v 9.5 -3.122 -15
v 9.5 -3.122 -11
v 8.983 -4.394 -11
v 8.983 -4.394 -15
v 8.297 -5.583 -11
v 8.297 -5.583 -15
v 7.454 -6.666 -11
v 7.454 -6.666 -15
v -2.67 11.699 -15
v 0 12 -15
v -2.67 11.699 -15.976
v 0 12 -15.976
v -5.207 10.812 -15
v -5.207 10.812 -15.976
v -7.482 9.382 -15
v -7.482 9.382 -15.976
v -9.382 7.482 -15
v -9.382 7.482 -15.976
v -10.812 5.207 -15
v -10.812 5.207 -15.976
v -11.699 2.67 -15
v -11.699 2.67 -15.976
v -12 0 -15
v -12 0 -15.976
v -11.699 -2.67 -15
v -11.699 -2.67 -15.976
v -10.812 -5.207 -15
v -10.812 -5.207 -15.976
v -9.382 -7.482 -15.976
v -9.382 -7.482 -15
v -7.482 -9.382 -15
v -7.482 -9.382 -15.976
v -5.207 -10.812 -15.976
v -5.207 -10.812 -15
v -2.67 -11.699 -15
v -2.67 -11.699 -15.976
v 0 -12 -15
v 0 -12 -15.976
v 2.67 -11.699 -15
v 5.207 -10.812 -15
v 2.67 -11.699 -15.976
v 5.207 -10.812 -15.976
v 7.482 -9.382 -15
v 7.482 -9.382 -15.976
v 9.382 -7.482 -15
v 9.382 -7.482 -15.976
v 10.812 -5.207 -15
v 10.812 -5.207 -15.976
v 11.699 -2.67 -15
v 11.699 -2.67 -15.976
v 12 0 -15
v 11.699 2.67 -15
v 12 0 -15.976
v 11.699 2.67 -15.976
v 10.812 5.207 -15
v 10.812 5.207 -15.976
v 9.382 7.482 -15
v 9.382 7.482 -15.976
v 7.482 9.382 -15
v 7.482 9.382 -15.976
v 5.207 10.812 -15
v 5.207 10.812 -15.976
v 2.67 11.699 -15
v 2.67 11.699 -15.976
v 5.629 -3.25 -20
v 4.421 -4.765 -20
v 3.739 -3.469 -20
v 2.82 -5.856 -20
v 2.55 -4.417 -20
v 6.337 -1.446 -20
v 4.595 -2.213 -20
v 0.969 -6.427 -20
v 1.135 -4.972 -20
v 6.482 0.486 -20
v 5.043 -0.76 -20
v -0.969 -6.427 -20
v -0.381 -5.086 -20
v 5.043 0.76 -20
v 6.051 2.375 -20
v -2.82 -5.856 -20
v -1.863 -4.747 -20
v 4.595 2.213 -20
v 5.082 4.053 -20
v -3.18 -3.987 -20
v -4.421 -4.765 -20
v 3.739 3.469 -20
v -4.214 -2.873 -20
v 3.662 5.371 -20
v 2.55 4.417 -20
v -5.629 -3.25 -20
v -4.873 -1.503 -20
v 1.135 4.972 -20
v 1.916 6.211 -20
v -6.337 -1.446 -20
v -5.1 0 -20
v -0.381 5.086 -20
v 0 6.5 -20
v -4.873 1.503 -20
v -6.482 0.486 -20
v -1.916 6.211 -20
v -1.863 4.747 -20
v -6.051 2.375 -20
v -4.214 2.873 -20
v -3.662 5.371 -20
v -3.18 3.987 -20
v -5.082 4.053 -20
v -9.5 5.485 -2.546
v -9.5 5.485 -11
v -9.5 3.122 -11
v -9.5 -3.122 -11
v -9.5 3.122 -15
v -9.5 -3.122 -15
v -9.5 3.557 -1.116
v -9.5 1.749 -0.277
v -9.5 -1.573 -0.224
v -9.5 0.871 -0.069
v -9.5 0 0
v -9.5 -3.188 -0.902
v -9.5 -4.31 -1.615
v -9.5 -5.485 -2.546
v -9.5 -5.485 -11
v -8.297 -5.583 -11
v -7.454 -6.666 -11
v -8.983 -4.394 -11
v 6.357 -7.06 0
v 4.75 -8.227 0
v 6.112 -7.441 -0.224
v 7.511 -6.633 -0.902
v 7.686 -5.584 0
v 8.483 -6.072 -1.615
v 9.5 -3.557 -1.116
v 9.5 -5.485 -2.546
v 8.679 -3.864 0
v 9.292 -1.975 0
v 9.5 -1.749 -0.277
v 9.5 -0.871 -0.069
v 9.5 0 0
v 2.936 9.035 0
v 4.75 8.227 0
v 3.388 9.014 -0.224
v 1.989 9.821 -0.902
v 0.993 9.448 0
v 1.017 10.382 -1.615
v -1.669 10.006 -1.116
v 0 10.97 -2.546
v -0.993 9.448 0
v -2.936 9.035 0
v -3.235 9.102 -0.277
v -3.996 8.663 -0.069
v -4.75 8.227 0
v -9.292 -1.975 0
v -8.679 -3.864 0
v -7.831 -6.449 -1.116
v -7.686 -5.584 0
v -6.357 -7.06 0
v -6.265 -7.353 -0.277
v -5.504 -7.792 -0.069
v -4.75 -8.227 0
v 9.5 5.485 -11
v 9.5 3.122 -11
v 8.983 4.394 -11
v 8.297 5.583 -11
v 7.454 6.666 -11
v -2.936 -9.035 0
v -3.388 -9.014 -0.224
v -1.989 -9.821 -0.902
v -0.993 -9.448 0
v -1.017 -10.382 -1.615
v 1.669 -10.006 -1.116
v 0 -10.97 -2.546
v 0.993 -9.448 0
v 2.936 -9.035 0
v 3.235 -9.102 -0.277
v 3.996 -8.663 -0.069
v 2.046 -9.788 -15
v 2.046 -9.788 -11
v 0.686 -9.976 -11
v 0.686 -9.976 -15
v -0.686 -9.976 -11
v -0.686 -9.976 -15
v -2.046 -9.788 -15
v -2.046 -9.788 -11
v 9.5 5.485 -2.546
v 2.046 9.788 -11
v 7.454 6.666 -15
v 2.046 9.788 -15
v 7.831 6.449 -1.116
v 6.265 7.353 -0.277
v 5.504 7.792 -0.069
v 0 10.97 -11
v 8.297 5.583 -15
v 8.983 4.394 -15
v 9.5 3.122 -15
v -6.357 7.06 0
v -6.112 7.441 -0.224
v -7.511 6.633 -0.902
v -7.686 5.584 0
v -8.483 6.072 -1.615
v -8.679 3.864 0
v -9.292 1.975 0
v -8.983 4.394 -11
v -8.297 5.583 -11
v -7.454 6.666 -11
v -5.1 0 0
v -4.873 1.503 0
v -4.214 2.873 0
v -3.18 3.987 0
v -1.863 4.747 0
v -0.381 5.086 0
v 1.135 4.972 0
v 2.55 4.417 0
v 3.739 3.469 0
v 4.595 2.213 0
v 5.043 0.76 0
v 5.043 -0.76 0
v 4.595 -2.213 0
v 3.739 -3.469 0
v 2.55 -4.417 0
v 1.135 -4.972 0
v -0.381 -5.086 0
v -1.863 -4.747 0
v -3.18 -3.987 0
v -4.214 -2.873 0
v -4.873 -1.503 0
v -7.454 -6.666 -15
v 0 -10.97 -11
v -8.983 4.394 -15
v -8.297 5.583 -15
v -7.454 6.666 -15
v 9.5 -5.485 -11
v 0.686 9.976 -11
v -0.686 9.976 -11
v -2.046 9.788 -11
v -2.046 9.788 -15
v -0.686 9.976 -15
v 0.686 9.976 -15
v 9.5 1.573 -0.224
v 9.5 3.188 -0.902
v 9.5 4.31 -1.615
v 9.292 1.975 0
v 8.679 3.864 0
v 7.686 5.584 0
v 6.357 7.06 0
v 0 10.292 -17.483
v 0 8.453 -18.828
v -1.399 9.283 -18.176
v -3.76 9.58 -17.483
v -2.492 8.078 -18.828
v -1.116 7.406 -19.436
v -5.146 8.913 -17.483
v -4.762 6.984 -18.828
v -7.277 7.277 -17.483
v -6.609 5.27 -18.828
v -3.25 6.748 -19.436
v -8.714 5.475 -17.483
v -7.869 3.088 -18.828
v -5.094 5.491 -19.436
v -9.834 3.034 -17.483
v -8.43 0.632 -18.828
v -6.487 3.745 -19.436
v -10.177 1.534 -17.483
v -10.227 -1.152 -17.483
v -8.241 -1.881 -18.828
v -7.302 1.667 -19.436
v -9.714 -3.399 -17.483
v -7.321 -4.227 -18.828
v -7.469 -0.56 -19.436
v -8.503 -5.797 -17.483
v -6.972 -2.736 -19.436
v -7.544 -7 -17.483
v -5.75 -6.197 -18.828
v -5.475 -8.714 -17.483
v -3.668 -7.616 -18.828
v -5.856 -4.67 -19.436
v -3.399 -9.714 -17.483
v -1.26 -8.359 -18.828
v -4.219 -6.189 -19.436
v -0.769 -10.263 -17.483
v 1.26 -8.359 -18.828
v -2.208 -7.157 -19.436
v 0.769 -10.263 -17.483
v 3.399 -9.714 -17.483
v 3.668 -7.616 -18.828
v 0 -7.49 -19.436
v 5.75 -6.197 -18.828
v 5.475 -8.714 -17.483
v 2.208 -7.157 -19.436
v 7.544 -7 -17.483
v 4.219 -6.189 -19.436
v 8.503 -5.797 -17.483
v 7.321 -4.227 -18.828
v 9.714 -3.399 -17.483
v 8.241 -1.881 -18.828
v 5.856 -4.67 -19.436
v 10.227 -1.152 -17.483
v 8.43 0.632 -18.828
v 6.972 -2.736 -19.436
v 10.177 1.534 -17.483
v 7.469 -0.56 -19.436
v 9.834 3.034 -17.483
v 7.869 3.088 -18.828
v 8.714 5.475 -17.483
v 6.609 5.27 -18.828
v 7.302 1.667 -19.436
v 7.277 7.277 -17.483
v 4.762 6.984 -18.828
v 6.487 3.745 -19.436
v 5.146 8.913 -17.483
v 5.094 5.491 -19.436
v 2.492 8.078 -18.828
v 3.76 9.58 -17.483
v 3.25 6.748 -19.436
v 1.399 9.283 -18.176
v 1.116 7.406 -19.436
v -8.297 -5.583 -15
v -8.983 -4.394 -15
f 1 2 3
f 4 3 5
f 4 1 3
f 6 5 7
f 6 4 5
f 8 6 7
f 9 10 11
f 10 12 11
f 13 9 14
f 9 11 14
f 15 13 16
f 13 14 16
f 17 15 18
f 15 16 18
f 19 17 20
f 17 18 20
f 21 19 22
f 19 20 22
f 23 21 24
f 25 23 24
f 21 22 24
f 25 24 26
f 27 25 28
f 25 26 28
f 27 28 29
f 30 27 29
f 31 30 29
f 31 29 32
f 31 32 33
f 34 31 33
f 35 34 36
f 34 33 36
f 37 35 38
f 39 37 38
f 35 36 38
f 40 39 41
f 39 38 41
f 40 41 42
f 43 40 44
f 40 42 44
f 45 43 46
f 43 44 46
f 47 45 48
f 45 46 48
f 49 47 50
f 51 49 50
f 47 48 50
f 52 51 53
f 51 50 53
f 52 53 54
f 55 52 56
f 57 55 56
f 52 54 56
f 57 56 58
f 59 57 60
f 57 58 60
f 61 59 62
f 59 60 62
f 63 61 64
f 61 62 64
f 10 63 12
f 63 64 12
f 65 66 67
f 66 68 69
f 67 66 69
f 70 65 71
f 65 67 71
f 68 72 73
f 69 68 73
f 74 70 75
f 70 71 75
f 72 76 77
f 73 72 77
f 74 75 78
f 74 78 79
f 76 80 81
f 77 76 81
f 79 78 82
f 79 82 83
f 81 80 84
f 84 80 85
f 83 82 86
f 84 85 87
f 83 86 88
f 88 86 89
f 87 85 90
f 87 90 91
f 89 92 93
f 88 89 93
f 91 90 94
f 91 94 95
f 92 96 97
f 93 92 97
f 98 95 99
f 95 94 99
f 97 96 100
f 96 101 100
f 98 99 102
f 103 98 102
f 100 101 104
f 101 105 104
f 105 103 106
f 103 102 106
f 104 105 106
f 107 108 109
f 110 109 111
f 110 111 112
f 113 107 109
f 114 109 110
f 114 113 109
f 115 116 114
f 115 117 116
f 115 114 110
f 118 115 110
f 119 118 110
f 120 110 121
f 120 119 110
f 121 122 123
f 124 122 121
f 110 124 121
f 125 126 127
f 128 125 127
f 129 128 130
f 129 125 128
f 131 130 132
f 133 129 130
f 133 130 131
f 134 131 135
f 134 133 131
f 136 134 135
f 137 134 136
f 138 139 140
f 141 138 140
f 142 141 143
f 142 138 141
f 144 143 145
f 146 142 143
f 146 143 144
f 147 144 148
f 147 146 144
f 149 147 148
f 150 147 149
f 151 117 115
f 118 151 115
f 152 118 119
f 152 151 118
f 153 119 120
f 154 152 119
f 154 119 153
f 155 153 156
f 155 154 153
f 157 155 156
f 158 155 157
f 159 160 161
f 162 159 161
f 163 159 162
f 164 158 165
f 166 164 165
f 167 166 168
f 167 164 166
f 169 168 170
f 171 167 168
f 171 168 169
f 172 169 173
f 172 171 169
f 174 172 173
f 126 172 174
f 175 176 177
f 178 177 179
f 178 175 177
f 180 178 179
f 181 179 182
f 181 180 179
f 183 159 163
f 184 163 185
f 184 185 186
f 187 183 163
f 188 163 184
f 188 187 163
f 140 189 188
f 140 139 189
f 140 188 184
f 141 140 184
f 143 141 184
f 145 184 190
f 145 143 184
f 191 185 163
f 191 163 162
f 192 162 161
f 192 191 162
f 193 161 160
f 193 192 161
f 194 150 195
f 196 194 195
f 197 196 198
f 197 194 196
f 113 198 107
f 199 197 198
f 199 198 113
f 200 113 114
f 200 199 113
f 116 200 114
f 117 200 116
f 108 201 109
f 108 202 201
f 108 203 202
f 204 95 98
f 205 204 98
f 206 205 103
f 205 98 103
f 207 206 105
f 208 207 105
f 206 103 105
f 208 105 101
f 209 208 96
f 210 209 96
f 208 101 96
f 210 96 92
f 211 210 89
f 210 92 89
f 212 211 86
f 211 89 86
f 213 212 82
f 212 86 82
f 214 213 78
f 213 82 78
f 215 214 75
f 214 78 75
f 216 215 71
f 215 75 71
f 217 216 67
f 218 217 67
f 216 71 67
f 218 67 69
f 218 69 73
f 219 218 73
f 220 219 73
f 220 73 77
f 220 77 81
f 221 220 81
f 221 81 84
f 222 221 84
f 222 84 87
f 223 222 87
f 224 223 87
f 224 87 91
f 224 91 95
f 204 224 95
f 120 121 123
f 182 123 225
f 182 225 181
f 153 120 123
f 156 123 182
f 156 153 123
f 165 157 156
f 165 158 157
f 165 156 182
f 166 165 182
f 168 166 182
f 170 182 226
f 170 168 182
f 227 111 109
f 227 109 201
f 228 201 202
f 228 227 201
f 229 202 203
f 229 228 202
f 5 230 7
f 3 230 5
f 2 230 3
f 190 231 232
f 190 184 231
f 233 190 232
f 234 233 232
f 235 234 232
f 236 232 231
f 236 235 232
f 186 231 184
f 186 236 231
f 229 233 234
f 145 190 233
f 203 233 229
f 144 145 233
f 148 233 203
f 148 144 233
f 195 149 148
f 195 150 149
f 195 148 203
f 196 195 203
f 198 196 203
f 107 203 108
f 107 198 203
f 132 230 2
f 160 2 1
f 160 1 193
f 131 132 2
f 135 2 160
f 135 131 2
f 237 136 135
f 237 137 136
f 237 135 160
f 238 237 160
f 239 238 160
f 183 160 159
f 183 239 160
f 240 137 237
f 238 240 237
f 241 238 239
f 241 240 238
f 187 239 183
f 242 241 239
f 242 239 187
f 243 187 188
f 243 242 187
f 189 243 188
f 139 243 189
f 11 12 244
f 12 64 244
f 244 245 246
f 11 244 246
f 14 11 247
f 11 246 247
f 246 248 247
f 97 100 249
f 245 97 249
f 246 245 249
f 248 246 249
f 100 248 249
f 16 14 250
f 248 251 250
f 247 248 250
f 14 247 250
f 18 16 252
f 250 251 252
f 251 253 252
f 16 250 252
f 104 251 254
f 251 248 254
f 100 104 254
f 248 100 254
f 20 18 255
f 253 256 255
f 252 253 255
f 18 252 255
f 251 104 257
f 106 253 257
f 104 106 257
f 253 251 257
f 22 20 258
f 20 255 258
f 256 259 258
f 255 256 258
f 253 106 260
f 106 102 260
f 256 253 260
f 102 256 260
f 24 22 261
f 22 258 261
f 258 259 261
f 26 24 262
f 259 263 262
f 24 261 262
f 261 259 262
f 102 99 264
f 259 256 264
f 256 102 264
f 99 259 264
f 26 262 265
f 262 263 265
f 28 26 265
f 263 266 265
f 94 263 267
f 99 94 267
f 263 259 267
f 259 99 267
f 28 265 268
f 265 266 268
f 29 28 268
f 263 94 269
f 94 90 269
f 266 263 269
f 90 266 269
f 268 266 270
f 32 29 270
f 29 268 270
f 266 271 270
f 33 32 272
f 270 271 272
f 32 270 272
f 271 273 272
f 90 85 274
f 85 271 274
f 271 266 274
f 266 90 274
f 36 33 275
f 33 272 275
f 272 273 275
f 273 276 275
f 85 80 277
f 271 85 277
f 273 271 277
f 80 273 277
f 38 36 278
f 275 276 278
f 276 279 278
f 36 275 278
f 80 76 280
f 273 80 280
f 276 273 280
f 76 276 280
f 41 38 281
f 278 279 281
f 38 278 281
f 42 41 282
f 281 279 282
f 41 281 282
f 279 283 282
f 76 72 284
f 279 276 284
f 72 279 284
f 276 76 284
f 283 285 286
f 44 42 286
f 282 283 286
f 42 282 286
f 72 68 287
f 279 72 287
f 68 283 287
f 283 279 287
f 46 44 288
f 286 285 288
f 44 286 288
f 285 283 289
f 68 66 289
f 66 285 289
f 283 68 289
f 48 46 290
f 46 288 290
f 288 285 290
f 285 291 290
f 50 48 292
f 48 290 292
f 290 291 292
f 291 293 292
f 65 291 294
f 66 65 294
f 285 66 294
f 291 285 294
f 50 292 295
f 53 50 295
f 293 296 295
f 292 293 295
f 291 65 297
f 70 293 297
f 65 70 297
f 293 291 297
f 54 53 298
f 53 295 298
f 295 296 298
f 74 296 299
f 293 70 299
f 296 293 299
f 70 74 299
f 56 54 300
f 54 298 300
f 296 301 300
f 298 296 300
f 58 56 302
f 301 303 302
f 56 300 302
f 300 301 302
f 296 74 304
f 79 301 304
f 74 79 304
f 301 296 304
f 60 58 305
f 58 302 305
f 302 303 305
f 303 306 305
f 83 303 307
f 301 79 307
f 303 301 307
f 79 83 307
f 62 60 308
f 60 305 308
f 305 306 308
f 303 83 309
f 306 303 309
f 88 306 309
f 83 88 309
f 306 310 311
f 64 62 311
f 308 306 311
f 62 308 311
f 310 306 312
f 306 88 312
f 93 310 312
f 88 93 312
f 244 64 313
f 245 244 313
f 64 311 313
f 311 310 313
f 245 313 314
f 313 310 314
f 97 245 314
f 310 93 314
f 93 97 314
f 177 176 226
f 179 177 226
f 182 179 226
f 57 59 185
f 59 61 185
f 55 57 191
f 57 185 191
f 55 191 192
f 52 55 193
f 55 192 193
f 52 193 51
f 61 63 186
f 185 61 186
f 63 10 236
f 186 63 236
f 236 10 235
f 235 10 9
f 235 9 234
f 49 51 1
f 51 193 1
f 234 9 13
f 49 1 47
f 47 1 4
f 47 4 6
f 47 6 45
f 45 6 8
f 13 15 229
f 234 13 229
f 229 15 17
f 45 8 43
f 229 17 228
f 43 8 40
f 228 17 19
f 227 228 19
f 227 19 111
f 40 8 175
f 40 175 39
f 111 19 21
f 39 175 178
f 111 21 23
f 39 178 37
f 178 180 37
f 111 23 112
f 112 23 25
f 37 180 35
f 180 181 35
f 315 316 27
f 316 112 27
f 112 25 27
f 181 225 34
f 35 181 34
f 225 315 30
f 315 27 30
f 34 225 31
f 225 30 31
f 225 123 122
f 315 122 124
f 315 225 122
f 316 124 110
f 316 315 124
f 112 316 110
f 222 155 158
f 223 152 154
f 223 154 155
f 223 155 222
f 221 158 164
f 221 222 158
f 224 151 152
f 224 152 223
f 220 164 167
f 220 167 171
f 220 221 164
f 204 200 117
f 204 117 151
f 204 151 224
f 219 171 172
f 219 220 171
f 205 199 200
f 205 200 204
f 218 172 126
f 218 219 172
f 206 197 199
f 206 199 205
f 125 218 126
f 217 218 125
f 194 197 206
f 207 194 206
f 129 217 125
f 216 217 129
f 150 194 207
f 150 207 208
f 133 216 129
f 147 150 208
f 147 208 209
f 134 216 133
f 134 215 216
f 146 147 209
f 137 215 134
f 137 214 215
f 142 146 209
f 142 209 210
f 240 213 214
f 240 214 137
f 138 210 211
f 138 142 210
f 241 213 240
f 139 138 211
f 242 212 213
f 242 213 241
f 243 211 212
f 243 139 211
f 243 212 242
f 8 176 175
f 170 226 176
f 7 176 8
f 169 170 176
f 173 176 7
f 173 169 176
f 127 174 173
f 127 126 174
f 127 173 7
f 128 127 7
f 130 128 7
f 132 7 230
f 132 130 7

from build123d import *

# Parameters (mm, degrees)
EXTRUDE_1_DEPTH     = 15
SKETCH_2_OUTSIDE_W  = 27.534
SKETCH_2_OUTSIDE_H  = 30.474
SKETCH_2_OUTSIDE_R  = 10
CUT_EXTRUDE_1_DEPTH = 4
SKETCH_4_OUTSIDE_W  = 65.322
SKETCH_4_OUTSIDE_H  = 65.322
SKETCH_4_OUTSIDE_R  = 9.5
CUT_EXTRUDE_2_DEPTH = 27.229754265
CUT_EXTRUDE_2_DRAFT = -30
HOLE_WIZARD_M12_1_D = 10.2


with BuildPart() as part:
    # 草图1 → 凸台-拉伸1 (new body)
    with BuildSketch(Plane.XY):
        Polygon((0, 10.969655115), (-9.5, 5.484827557), (-9.5, -5.484827557), (0, -10.969655115), (9.5, -5.484827557), (9.5, 5.484827557), align=None)
    extrude(amount=-EXTRUDE_1_DEPTH)

    # 草图2 outside → 切除-拉伸1 (cut)
    with BuildSketch(Plane(origin=(0, 0, -15), x_dir=(-1, 0, 0), z_dir=(0, 0, -1))):
        Rectangle(SKETCH_2_OUTSIDE_W, SKETCH_2_OUTSIDE_H)
        Circle(SKETCH_2_OUTSIDE_R, mode=Mode.SUBTRACT)
    extrude(amount=-CUT_EXTRUDE_1_DEPTH, mode=Mode.SUBTRACT)

    # 草图3 → 旋转1 (revolve)
    with BuildSketch(Plane(origin=(0, 0, 0), x_dir=(0, 0, -1), z_dir=(1, 0, 0))):
        with BuildLine():
            Line((15, 0), (15, 12))
            Line((15, 12), (15.975879312, 12))
            ThreePointArc((15.975879312, 12), (18.176229373, 9.387763735), (20, 6.5))
            Line((20, 6.5), (20, 0))
            Line((20, 0), (15, 0))
        make_face()
    revolve(axis=Axis((0, 0, -20), (0, 0, 1)))


with BuildPart() as cut_extrude_2_tool:
    # 草图4 outside → 切除-拉伸2 (with draft: the straight prism first)
    with BuildSketch(Plane.XY):
        Rectangle(SKETCH_4_OUTSIDE_W, SKETCH_4_OUTSIDE_H)
        Circle(SKETCH_4_OUTSIDE_R, mode=Mode.SUBTRACT)
    extrude(amount=-CUT_EXTRUDE_2_DEPTH)
    # 切除-拉伸2: the draft: its side faces are tilted about the plane it starts from
    cut_extrude_2_sides = [cut_extrude_2_tool.faces().sort_by_distance(p)[0] for p in [
        (0, -32.661, -13.614877132),
        (32.661, 0, -13.614877132),
        (0, 32.661, -13.614877132),
        (-32.661, 0, -13.614877132),
        (-9.5, 0, -13.614877132),
    ]]
    draft(cut_extrude_2_sides, Plane.XY, CUT_EXTRUDE_2_DRAFT)


with BuildPart() as part_1:
    add(part.part)

    # 切除-拉伸2: cut by cut_extrude_2_tool
    add(cut_extrude_2_tool.part, mode=Mode.SUBTRACT)

    # M12 螺纹孔1 (through all)
    with Locations(Plane.XY):
        with Locations((0, 0)):
            Hole(HOLE_WIZARD_M12_1_D / 2)


solid = part_1.part
